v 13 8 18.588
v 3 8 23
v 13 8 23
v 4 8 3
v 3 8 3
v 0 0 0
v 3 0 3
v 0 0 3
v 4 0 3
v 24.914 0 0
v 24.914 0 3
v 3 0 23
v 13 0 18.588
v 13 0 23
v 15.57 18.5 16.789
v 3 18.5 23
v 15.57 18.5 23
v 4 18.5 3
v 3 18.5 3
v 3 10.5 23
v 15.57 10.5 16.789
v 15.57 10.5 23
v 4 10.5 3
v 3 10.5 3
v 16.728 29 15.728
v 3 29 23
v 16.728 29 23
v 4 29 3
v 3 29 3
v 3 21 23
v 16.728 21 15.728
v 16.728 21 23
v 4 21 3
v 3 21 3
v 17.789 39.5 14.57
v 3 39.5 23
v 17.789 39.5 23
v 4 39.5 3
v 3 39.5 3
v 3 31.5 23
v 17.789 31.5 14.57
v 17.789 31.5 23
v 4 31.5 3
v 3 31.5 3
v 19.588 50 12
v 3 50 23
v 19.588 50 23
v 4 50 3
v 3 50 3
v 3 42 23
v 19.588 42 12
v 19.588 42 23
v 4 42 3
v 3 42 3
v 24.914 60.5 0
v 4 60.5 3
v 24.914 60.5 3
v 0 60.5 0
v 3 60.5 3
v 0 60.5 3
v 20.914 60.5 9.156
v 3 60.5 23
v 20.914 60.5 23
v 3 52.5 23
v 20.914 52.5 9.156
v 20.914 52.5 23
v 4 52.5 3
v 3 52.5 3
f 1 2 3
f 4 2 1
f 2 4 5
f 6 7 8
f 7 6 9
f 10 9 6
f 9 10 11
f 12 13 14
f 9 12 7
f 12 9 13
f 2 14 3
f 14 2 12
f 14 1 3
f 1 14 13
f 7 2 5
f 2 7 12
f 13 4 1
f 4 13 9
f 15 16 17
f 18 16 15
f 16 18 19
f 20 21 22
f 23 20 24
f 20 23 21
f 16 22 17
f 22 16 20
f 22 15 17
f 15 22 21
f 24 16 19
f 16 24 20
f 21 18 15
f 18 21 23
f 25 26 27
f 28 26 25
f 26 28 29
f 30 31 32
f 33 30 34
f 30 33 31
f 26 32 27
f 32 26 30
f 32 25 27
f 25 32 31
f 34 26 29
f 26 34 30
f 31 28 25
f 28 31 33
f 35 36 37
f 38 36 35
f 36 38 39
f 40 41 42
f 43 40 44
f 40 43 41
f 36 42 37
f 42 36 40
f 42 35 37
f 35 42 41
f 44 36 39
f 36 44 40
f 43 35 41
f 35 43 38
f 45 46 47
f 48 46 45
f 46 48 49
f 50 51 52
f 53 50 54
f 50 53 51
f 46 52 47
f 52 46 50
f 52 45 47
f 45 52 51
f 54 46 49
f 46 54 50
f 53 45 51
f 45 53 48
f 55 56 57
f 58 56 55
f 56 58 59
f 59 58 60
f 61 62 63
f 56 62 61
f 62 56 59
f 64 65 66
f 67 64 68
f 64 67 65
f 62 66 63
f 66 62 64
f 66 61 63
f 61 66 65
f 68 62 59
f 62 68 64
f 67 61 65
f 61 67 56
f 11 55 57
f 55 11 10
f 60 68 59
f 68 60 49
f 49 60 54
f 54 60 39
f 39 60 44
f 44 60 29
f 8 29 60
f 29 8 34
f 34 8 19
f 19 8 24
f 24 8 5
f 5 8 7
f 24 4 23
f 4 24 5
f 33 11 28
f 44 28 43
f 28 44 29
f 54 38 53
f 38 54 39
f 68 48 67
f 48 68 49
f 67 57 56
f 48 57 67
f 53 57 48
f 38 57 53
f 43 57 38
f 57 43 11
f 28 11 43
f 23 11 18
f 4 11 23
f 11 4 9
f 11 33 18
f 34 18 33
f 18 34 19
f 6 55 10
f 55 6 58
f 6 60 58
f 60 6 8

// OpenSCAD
/*
	overhang-stairs — 免支撑临界角阶梯（30/40/45/50/60/70°）

	测什么
		六片悬臂，斜面与**竖直方向**的夹角分别为 30/40/45/50/60/70°。
		角度越大越难打；FDM 常规判据是 45°（即斜面与水平面成 45°）起开始退化。

	怎么判读
		- 从 30° 往上打，第一片出现下垂/毛糙/分层的那一档，就是本机的免支撑临界角。
		- 40° 及以下应当完全平整；45° 是分界，边缘轻微毛糙可接受；
		  50° 以上底面开始拉丝、下垂，60/70° 基本一定要支撑。
		- 只毛糙、能连成一片 = 还能打；底面塌陷、出现悬空丝 = 已过临界角。
		- 记下角度后，建模时把所有朝下的斜面控制在临界角以内（本插件
		  print3d_check 的"真悬垂"就是按这个角度判的）。
		- 注意量角基准：这里量的是**斜面与竖直方向**的夹角。print3d_check 输出的
		  theta 是斜面与**水平面**的夹角，两者互补：theta = 90° - 本图角度。
		  所以 50° 片在体检里 theta≈40°（会被算作真悬垂），45° 片 theta≈45°（正好在边界）。

	期望值（默认参数）
		STL 体积 ≈14.8 cm³，包围盒 24.90 × 60.50 × 23.00 mm，6 个独立实体，水密。
		真悬垂面积 ≈4.3 cm²：恰好是 50/60/70 三片的斜面（3 × 18 × 8 = 432 mm²），
		30/40 片因为 theta≥45° 不计入，45 片在边界上（通常也不计入）。
		如果体检报出的悬垂面积远大于 4.3 cm²，说明斜面角没被正确识别。

	参数
		angle_1..6  六片斜面与竖直方向的夹角（度）
		reach       斜面长度 (mm)：决定悬臂伸出多远，也直接决定悬垂面积
		fin_t       每片沿 Y 的厚度 (mm)
		fin_h       台面以上每片的竖直高度 (mm)
		gap         片间净距 (Y)
		base_h      台面高度 (mm)：斜面从台面顶起算，不贴床，避免被"贴床面"豁免
		margin      台面左右外扩 (mm)
*/

/* [悬臂角（自竖直方向量）] */
angle_1 = 30;     // 第 1 片：最容易
angle_2 = 40;     // 第 2 片
angle_3 = 45;     // 第 3 片：FDM 经典分界
angle_4 = 50;     // 第 4 片：开始需要留意
angle_5 = 60;     // 第 5 片
angle_6 = 70;     // 第 6 片：基本必须支撑

/* [尺寸] */
reach = 18;       // 斜面长度 (mm)
fin_t = 8;        // 每片厚度 (Y)
fin_h = 20;       // 台面以上竖直高度 (Z)
gap = 2.5;        // 片间净距 (Y)

/* [底座] */
base_h = 3;       // 台面高度 (mm)
margin = 4;       // 台面外扩 (mm)
embed = 1;        // 斜面在台面内部多埋入的长度，保证是体积相交而不是刀刃接触
assert(reach > 0 && fin_h > 2, "reach / fin_h 必须 > 0");
assert(base_h > embed * 1.8, "base_h 太小：embed 会把片底切到 z<0");

angles = [angle_1, angle_2, angle_3, angle_4, angle_5, angle_6];
n_fins = len(angles);
max_reach = max([for (a = angles) reach * sin(a)]);
plate_w = margin + max_reach + margin;
total_y = n_fins * fin_t + (n_fins - 1) * gap;

module stair(beta, y0) {
	x1 = margin + reach * sin(beta);
	z1 = base_h + reach * cos(beta);
	top = base_h + fin_h;
	// 把斜面沿自身方向往台面里延长 embed：几何角仍是精确的 beta，
	// 但和台面是体积相交（并集干净），而不是只有一条公共棱。
	x0 = margin - embed;
	z0 = base_h - embed / tan(beta);
	assert(z0 > 0.2, "base_h / embed 组合会让斜面切到 z<0");
	assert(z1 < top - 1, "fin_h 太小：加大 fin_h 或减小 reach");
	// rotate([90,0,0]) 把 2D 轮廓的 (x,y) 映射成 3D 的 (x,z)，挤出方向是 -Y，
	// 所以整体平移 y0+fin_t 之后正好占据 [y0, y0+fin_t]。
	translate([0, y0 + fin_t, 0])
		rotate([90, 0, 0])
			linear_extrude(height = fin_t)
				polygon([[x0, z0], [x1, z1], [x1, top], [x0, top]]);
}

module base_plate() {
	cube([plate_w, total_y, base_h]);
}

union() {
	base_plate();
	for (i = [0:n_fins - 1]) {
		translate([0, i * (fin_t + gap), 0]) stair(angles[i], 0);
	}
}
